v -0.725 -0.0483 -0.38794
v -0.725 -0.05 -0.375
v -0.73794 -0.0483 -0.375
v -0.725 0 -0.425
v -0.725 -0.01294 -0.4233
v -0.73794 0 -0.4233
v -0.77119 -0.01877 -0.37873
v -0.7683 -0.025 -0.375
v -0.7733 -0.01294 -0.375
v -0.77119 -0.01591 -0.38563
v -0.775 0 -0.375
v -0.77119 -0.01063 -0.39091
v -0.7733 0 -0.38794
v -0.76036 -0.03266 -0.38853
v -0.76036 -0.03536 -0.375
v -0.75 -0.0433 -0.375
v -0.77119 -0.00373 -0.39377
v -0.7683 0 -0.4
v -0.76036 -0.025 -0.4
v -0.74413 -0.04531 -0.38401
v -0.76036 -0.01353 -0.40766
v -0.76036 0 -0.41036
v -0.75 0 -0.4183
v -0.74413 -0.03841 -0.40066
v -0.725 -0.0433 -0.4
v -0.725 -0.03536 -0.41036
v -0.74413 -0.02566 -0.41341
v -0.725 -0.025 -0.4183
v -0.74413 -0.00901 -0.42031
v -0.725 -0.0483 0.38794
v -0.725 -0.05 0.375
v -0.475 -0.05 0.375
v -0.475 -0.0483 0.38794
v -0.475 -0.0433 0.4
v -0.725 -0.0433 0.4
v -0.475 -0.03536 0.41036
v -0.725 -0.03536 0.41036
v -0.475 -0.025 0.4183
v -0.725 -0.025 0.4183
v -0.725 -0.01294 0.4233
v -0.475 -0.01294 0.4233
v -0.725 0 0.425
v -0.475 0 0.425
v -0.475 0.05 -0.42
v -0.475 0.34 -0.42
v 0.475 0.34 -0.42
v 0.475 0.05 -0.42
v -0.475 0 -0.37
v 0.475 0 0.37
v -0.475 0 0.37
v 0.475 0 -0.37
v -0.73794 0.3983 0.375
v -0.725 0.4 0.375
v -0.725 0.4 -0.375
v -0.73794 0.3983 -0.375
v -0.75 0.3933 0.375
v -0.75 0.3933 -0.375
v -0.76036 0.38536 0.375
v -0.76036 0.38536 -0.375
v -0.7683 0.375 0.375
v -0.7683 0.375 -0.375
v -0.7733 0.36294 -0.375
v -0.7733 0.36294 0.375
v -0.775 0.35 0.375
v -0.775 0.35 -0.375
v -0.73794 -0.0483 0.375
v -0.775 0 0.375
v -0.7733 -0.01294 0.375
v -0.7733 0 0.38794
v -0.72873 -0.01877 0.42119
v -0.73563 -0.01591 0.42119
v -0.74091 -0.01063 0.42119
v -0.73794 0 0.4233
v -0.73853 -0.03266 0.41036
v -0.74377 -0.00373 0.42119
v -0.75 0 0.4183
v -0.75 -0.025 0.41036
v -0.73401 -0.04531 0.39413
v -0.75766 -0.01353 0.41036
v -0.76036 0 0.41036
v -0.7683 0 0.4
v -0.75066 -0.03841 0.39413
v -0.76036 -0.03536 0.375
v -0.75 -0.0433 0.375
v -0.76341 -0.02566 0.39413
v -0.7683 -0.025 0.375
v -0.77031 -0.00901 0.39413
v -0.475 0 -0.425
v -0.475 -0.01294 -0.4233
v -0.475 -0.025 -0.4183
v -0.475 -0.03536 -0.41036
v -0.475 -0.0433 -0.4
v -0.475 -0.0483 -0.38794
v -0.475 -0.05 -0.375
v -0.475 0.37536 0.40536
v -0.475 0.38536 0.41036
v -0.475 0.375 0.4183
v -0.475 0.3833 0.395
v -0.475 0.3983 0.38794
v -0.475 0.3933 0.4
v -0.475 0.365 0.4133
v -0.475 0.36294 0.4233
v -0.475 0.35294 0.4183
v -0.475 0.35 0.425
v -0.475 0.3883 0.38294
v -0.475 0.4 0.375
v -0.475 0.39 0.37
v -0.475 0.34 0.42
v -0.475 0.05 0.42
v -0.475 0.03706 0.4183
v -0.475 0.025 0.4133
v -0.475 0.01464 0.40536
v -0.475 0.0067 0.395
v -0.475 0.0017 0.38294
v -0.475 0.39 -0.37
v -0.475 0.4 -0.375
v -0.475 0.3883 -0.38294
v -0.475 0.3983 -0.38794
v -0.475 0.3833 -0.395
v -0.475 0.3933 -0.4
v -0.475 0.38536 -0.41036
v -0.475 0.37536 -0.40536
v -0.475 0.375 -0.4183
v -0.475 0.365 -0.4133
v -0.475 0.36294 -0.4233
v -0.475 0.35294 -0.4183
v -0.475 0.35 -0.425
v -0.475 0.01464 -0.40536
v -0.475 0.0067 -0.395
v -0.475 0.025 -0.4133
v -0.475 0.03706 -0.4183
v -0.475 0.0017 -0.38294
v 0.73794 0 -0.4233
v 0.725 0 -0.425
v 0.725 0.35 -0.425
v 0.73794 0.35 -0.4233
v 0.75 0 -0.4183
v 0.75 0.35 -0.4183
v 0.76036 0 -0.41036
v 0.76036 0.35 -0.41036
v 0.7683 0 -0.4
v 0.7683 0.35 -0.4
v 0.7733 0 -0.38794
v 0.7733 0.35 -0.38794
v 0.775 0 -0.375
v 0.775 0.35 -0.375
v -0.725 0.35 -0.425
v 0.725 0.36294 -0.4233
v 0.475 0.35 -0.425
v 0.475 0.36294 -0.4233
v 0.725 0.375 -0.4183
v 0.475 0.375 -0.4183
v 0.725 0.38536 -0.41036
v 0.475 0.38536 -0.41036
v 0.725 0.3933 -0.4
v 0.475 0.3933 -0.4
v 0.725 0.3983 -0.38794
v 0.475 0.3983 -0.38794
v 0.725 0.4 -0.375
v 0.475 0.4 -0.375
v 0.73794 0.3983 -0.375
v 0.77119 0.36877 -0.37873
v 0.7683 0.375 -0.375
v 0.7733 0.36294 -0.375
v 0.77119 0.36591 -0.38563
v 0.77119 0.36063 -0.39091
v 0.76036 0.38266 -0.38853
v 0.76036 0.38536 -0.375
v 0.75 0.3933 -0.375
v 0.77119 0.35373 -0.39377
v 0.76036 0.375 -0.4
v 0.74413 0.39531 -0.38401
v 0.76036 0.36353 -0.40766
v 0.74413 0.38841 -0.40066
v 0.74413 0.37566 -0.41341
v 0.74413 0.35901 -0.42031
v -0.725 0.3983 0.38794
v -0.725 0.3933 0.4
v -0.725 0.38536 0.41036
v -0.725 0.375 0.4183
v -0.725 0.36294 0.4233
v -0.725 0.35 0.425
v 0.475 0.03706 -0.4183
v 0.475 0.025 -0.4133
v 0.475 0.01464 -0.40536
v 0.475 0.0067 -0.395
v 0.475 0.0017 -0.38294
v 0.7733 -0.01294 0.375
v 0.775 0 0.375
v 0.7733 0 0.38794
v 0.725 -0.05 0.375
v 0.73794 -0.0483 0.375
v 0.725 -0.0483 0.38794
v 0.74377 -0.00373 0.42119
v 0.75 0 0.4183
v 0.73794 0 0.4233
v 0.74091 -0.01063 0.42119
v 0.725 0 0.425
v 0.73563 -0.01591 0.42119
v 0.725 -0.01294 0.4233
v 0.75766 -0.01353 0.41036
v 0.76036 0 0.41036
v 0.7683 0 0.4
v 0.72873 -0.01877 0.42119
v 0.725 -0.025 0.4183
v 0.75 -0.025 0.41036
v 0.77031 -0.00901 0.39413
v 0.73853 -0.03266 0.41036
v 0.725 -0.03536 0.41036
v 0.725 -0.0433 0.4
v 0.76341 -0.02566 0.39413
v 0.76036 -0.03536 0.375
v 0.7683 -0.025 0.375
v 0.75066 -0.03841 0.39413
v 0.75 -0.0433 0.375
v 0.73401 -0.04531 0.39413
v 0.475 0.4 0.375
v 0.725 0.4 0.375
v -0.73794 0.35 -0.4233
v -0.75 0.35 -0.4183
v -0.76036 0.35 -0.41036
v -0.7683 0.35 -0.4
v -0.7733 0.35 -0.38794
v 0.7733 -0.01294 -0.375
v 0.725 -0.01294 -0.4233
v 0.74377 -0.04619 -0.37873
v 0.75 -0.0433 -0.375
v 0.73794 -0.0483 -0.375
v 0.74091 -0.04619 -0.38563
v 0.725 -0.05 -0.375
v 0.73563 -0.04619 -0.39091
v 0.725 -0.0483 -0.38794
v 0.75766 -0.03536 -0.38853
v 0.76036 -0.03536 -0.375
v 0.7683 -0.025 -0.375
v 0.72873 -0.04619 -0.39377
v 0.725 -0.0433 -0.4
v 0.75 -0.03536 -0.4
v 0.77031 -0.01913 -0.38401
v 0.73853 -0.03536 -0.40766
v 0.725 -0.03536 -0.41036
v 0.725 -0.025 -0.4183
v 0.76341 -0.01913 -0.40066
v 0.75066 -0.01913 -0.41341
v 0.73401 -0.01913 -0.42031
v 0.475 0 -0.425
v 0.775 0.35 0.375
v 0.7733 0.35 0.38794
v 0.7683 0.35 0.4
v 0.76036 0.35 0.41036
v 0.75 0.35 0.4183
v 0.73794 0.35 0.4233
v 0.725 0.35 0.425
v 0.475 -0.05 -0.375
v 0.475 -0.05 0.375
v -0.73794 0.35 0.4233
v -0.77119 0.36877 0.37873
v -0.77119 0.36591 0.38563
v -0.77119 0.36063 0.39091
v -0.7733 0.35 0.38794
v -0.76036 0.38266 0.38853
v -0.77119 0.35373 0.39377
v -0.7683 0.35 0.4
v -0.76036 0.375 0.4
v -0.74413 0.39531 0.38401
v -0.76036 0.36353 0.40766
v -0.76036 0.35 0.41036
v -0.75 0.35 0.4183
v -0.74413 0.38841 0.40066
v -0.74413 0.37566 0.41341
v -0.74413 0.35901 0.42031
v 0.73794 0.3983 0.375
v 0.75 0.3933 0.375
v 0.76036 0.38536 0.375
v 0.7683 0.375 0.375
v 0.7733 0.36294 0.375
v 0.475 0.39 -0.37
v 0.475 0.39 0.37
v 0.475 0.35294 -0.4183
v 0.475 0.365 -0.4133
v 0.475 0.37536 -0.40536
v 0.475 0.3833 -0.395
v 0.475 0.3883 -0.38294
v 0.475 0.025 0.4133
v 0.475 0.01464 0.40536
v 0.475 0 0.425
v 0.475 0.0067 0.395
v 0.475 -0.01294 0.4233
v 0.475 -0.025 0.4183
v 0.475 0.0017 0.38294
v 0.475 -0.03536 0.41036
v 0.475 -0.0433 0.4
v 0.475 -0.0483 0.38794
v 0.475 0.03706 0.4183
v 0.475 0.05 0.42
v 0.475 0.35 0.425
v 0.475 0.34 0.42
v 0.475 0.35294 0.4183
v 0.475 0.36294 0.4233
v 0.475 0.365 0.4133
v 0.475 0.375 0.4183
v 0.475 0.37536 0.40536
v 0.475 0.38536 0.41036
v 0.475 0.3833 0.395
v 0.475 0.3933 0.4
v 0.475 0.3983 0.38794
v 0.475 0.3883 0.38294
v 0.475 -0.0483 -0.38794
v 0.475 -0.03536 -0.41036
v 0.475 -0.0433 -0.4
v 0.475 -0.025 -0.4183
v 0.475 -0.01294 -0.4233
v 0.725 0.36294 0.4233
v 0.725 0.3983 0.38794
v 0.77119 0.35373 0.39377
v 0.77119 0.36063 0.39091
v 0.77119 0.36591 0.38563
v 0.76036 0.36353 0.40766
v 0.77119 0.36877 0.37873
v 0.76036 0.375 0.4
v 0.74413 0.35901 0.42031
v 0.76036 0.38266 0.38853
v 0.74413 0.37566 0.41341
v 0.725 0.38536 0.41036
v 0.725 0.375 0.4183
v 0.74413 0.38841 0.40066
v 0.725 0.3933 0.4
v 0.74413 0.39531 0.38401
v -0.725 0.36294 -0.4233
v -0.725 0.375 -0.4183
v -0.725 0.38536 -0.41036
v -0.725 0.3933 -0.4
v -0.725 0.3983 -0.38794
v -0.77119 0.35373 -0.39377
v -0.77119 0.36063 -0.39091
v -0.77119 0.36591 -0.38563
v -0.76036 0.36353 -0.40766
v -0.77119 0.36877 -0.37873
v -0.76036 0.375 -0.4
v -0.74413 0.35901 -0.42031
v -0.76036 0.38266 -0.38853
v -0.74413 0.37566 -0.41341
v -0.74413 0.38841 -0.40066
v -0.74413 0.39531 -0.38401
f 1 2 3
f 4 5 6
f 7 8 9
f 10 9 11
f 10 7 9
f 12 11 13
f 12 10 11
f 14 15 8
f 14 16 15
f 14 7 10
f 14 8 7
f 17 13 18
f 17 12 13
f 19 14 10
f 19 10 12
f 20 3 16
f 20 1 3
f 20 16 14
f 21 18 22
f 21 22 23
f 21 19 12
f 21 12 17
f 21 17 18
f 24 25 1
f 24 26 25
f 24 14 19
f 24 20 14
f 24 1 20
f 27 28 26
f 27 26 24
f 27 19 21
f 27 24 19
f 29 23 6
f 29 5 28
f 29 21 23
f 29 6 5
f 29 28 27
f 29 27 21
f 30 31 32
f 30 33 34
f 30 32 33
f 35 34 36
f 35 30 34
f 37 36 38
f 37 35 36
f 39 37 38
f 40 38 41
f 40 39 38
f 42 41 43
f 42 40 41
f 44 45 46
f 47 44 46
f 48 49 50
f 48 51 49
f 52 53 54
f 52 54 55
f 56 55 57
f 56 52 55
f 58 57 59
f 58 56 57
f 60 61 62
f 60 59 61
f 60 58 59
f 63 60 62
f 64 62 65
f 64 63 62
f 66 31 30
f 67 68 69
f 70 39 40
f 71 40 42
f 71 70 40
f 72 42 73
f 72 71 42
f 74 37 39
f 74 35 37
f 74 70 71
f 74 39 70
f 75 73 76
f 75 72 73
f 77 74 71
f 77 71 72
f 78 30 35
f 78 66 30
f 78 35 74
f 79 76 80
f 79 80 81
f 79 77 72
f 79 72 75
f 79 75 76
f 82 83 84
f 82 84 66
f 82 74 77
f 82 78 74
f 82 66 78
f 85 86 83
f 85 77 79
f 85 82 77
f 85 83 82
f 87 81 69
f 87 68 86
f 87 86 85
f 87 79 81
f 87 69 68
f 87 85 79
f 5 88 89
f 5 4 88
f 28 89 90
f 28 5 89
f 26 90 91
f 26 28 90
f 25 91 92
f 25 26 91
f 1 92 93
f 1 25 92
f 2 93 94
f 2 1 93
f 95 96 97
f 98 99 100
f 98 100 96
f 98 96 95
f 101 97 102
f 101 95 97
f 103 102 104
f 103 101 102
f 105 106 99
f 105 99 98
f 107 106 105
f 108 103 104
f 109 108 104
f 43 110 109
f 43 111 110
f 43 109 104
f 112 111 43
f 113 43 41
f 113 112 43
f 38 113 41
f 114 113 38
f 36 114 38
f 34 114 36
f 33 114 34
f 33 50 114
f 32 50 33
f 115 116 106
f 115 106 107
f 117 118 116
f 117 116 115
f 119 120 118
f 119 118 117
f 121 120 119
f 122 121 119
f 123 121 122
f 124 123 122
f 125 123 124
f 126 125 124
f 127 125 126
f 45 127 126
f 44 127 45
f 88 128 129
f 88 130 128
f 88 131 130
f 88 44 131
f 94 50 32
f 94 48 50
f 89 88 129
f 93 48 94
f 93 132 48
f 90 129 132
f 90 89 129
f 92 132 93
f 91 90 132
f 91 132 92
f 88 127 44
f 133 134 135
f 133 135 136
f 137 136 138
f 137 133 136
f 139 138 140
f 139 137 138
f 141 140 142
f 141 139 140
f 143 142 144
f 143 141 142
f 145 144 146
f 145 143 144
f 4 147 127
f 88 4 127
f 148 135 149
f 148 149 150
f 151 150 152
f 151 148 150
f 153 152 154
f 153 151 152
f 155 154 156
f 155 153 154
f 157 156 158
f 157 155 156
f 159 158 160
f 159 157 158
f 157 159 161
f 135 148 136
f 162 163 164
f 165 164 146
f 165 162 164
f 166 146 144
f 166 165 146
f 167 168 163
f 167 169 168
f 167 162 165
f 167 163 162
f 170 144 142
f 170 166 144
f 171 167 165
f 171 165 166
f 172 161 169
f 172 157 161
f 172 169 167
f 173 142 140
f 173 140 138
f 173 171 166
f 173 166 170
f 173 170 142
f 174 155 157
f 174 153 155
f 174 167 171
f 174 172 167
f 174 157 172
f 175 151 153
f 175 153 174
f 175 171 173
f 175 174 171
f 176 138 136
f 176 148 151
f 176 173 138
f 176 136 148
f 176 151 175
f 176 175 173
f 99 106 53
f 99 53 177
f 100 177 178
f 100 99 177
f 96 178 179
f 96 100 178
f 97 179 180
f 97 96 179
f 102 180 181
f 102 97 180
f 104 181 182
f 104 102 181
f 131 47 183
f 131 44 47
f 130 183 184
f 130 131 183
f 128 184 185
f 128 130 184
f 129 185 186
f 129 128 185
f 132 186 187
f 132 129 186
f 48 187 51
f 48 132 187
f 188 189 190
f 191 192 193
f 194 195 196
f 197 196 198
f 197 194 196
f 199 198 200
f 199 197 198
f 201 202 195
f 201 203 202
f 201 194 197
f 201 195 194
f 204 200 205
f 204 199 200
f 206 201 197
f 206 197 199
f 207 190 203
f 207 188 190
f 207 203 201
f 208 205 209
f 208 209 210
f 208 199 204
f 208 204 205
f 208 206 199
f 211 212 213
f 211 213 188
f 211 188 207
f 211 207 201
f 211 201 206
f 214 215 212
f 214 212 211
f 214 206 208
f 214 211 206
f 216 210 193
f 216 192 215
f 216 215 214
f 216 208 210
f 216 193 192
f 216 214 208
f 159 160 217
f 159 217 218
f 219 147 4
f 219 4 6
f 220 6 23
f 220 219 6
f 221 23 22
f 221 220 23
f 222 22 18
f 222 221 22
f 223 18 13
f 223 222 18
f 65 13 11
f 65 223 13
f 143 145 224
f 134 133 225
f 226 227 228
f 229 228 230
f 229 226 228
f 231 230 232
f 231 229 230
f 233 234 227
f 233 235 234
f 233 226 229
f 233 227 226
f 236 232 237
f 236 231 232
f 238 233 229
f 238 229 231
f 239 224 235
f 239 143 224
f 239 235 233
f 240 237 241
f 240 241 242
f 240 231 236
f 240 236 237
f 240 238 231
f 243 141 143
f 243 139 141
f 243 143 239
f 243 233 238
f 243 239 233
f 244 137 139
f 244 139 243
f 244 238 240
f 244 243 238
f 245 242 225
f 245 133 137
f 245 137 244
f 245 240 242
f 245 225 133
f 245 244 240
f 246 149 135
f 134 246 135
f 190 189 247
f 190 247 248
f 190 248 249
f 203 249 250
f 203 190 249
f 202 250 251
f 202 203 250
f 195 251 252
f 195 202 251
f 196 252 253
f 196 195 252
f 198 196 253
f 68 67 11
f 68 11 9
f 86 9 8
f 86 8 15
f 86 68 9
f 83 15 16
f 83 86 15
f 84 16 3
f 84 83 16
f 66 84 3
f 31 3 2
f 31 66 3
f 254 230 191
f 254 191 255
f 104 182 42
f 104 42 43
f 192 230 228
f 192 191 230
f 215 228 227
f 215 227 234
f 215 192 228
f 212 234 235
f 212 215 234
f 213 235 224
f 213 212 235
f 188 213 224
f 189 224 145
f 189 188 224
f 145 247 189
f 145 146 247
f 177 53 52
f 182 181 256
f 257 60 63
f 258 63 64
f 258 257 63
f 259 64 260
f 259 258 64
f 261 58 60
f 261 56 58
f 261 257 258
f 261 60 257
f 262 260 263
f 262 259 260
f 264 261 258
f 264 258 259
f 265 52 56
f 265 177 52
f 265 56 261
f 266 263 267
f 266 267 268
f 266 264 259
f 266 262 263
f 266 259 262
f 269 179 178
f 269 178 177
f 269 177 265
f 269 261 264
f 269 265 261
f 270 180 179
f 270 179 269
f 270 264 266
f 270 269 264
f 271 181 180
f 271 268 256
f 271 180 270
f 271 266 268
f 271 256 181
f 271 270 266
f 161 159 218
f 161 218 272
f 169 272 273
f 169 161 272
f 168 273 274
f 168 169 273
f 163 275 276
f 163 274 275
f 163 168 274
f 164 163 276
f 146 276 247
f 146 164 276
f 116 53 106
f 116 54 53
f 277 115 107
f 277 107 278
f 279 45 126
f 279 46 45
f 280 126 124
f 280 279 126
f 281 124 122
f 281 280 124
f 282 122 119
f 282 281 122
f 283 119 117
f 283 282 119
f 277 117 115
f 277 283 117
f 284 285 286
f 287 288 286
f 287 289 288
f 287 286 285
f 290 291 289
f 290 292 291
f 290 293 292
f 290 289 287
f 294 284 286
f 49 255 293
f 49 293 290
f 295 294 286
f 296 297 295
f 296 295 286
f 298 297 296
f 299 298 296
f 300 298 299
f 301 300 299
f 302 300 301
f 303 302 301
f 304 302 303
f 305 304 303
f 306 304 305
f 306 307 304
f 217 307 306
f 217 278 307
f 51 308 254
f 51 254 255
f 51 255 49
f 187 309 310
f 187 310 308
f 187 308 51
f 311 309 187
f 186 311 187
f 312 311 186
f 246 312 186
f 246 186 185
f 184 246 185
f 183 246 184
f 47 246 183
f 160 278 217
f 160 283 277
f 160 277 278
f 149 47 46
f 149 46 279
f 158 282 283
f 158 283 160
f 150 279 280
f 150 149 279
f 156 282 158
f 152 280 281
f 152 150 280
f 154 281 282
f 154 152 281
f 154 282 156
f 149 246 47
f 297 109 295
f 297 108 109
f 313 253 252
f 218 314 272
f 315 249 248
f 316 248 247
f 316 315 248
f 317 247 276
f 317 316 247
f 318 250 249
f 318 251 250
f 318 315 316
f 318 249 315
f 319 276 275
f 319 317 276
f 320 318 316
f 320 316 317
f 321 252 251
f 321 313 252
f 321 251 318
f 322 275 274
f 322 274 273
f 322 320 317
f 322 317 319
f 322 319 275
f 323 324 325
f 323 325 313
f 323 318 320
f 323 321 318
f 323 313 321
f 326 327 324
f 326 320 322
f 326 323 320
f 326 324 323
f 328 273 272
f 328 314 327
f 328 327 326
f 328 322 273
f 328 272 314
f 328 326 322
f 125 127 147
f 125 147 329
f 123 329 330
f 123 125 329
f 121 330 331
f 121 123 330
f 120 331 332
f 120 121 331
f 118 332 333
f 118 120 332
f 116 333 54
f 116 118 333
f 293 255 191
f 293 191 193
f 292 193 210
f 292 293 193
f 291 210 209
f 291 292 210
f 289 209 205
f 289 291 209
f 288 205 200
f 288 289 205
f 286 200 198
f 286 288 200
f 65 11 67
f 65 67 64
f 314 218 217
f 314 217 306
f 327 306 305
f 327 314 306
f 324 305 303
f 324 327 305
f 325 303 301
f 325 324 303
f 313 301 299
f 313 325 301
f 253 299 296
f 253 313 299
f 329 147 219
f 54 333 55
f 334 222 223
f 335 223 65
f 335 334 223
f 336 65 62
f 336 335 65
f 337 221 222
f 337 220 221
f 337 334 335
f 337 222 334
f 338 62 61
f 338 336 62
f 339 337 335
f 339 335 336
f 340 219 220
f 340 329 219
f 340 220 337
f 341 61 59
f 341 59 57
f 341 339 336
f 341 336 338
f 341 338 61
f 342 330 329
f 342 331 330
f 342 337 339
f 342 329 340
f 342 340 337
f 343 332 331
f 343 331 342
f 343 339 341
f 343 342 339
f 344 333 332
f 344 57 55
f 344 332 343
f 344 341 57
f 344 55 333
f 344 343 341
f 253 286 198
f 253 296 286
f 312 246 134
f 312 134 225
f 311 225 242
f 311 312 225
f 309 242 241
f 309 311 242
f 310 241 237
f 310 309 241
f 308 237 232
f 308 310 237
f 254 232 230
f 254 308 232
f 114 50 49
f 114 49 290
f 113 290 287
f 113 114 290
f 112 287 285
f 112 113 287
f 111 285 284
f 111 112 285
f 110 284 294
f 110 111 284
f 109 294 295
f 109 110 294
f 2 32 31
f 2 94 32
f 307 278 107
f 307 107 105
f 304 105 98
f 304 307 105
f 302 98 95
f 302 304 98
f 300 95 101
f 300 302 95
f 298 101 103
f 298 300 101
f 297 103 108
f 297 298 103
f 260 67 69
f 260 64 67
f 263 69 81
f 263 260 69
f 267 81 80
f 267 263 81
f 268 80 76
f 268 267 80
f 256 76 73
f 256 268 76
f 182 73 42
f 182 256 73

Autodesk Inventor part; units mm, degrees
ref_plane "YZ Plane" through (0, 0, 0) normal (1, 0, 0) x (0, 1, 0)
ref_plane "XZ Plane" through (0, 0, 0) normal (0, 1, 0) x (-1, 0, 0)
ref_plane "XY Plane" through (0, 0, 0) normal (0, 0, 1) x (1, 0, 0)
sketch "Sketch1" plane through (0, 0, 0) normal (0, 0, 1) x (1, 0, 0)
  line L0 (-0.775, 0.4) -> (-0.475, 0.4)
  line L1 (-0.475, 0.4) -> (-0.475, -0.05)
  line L2 (-0.475, -0.05) -> (-0.775, -0.05)
  line L3 (-0.775, -0.05) -> (-0.775, 0.4)
  line L4 (-0.475, 0.39) -> (0.475, 0.39)
  line L5 (0.475, 0.39) -> (0.475, 0)
  line L6 (0.475, 0) -> (-0.475, 0)
  line L7 (-0.475, 0) -> (-0.475, 0.39)
  line L8 (0.475, 0.4) -> (0.775, 0.4)
  line L9 (0.775, 0.4) -> (0.775, -0.05)
  line L10 (0.775, -0.05) -> (0.475, -0.05)
  line L11 (0.475, -0.05) -> (0.475, 0.4)
  point P0 (0, 0)
  point P1 (0, 0.39)
  point P2 (0, 0)
  dimension "d0" = 1.55
  dimension "d1" = 0.45
  dimension "d2" = 0.3
  dimension "d3" = 0.05
  dimension "d6" = 0.01
extrude "Extrusion1" add sketch "Sketch1" along normal mid plane 0.85 contours L0 L1 L2 L3 | L11 L8 L9 L10 L5
extrude "Extrusion2" add sketch "Sketch1" along normal mid plane 0.84 contours L4 L5 L6 L1
fillet "Fillet1" radius 0.05 20 edges at (-0.625, 0.4, 0.425) (0, 0.39, 0.42) (0.625, 0.4, 0.425) (-0.625, 0.4, -0.425) (0, 0.39, -0.42) (0.625, 0.4, -0.425) (0.775, 0.4, 0) (0.775, 0.175, -0.425) (0.775, -0.05, 0) (0.625, -0.05, -0.425) (0.625, -0.05, 0.425) (0.775, 0.175, 0.425) (0, 0, 0.42) (0, 0, -0.42) (-0.625, -0.05, -0.425) (-0.775, -0.05, 0) (-0.775, 0.175, 0.425) (-0.625, -0.05, 0.425) (-0.775, 0.175, -0.425) (-0.775, 0.4, 0)
properties part number "Thermistor_1608" material "Copper"
